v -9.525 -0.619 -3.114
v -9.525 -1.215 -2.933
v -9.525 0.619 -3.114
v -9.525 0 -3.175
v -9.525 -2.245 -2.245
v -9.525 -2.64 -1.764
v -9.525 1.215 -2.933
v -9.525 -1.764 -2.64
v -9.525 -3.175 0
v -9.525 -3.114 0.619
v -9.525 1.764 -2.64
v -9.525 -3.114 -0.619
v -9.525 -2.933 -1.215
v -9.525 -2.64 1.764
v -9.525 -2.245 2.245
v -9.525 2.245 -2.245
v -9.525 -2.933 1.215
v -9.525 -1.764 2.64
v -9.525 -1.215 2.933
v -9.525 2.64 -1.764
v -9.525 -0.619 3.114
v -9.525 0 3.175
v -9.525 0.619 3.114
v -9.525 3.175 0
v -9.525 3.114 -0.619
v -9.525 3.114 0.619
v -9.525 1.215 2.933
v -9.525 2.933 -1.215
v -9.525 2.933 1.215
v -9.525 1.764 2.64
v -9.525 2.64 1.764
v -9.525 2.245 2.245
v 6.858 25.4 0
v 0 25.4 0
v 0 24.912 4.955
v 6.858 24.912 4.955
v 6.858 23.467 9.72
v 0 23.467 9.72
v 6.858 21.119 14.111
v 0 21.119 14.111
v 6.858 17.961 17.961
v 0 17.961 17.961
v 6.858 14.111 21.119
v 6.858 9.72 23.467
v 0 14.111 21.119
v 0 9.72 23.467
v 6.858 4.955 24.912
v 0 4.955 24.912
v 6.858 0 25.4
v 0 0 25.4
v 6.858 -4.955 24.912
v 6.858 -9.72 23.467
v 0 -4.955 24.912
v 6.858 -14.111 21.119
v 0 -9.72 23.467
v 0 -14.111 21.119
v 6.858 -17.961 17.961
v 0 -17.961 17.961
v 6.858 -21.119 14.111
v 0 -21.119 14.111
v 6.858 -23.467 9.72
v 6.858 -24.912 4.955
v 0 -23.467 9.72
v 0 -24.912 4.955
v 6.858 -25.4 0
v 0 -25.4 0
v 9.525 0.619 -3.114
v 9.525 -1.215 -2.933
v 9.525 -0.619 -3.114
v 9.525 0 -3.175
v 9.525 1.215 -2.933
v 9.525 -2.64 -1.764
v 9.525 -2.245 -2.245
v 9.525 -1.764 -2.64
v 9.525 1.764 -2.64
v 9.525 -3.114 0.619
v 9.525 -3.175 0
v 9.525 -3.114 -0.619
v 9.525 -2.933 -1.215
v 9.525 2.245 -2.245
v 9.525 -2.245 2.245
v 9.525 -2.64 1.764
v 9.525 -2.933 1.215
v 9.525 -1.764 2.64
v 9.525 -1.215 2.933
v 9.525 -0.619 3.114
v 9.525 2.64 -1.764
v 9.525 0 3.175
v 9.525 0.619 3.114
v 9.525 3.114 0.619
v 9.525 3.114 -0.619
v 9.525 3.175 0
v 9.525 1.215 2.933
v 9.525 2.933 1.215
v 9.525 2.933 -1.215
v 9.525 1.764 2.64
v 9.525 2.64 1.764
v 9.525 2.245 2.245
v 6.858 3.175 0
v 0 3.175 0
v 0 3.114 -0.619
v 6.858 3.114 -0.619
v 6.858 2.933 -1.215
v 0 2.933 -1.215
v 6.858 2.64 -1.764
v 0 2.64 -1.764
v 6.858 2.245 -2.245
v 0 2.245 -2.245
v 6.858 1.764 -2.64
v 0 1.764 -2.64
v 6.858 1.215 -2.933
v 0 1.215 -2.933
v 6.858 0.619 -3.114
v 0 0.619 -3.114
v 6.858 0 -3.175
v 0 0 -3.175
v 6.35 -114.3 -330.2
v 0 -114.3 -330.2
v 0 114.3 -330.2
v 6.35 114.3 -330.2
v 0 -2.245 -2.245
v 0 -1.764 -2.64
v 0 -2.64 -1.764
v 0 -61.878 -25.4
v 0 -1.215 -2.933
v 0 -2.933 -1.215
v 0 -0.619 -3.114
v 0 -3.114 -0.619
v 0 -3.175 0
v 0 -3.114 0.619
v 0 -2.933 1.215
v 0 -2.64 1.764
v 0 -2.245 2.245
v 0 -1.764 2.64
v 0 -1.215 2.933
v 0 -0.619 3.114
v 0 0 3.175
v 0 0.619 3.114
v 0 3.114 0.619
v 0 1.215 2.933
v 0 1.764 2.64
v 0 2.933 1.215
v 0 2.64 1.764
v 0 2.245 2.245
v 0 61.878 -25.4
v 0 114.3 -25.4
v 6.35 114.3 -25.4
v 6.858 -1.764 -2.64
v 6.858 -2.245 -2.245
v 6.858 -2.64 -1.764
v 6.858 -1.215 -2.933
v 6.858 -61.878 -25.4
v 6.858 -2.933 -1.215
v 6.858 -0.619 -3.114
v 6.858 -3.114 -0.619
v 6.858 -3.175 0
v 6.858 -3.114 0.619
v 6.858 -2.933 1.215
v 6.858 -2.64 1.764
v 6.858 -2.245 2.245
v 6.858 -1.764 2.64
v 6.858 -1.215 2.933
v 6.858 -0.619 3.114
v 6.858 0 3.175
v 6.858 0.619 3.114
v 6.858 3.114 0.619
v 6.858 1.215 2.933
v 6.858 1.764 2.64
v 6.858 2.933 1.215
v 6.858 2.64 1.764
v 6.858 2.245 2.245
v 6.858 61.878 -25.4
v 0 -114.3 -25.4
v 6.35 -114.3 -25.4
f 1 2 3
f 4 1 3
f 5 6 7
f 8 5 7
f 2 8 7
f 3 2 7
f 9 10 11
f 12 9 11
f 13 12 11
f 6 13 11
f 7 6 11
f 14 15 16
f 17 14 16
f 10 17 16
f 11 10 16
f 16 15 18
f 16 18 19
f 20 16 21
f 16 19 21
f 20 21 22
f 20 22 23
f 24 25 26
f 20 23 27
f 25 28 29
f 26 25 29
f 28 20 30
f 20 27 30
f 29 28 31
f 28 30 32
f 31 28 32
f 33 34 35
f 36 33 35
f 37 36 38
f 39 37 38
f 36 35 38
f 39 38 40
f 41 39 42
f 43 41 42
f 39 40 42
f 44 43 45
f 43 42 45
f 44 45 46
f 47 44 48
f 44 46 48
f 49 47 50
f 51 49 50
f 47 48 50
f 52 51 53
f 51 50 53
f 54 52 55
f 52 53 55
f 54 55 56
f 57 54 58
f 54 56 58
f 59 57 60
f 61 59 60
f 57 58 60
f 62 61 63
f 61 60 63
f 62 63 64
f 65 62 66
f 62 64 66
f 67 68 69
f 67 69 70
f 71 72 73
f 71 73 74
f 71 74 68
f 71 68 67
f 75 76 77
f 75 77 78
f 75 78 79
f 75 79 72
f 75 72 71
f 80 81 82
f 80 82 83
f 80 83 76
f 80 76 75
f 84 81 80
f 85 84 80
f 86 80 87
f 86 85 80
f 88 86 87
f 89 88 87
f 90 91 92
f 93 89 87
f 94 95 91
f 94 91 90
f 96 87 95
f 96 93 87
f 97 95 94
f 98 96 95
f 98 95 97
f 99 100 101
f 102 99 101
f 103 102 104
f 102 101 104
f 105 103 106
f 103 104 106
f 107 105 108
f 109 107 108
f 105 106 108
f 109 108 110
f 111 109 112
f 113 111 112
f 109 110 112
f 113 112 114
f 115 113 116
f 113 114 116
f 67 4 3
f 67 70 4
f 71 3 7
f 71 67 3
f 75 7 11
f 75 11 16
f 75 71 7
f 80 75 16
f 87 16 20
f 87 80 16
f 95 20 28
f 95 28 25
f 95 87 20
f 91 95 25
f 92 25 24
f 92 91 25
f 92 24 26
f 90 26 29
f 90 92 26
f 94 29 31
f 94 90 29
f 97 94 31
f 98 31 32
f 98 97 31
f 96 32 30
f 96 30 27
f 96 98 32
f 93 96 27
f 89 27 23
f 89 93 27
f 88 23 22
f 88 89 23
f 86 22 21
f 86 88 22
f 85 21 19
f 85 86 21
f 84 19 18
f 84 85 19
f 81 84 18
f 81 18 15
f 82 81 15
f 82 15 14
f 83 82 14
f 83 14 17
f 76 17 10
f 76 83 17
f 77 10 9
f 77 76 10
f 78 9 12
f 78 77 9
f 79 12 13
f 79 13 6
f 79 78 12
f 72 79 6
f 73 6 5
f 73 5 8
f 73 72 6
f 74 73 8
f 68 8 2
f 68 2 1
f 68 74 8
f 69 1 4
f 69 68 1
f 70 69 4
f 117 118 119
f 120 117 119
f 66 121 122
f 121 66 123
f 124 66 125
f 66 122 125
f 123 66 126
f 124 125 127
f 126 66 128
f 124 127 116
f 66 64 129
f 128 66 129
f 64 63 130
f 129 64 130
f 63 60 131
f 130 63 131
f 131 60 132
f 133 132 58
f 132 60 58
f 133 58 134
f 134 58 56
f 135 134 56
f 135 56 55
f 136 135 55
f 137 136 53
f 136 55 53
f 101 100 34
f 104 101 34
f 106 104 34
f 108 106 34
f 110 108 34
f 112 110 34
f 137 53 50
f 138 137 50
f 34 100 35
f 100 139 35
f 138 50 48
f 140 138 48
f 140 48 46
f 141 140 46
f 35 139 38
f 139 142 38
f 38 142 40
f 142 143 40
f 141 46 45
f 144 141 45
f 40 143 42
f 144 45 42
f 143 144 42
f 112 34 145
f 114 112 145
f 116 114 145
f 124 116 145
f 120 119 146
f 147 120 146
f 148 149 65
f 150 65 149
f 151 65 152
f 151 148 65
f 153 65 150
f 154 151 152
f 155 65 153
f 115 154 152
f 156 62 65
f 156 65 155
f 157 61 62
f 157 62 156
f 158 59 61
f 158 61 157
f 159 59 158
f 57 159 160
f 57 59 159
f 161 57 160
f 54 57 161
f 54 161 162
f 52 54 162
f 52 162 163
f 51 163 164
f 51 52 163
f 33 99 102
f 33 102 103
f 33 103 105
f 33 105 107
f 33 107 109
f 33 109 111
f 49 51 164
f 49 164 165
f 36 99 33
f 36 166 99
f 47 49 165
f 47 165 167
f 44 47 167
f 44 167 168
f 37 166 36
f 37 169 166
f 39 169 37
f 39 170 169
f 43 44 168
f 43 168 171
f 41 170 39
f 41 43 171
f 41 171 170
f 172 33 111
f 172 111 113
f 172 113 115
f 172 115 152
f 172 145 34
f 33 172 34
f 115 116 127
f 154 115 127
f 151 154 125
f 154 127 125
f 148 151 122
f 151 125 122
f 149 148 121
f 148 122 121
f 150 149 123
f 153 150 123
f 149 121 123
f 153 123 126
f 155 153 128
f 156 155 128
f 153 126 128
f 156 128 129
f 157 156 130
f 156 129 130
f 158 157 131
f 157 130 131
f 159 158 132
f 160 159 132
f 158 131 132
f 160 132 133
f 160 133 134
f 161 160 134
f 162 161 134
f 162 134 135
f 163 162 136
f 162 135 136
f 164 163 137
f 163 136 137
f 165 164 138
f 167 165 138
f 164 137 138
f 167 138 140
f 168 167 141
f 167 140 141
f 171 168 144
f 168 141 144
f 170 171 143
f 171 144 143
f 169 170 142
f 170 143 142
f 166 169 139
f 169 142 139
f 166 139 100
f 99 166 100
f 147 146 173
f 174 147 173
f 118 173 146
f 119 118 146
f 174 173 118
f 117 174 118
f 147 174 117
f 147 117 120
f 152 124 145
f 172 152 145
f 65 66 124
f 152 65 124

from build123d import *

# Parameters (mm, degrees)
F1_DEPTH = 9.525
F2_DEPTH = 6.35
F3_DEPTH = 6.858


with BuildPart() as f1:
    # F0 (on Right) → F1 (new body, symmetric)
    with BuildSketch(Plane.YZ):
        with BuildLine():
            ThreePointArc((0, -3.175), (2.245064, -2.245064), (3.175, 0))
            ThreePointArc((3.175, 0), (-2.245064, 2.245064), (0, -3.175))
        make_face()
    extrude(amount=F1_DEPTH, both=True)


with BuildPart() as f2:
    # F0 (on Right) → F2 (new body)
    with BuildSketch(Plane.YZ):
        Polygon((61.877973, -25.4), (0, -25.4), (-61.877973, -25.4), (-114.3, -25.4), (-114.3, -330.2), (114.3, -330.2), (114.3, -25.4), align=None)
    extrude(amount=F2_DEPTH)


with BuildPart() as f3:
    # F0 (on Right) → F3 (new body)
    with BuildSketch(Plane.YZ):
        with BuildLine():
            Line((-61.877973, -25.4), (0, -25.4))
            ThreePointArc((0, -25.4), (-17.960512, -17.960512), (-25.4, 0))
            Line((-25.4, 0), (-61.877973, -25.4))
        make_face()
        with BuildLine():
            ThreePointArc((-25.4, 0), (-17.960512, -17.960512), (0, -25.4))
            ThreePointArc((0, -25.4), (17.960512, -17.960512), (25.4, 0))
            ThreePointArc((25.4, 0), (0, 25.4), (-25.4, 0))
        make_face()
        with BuildLine():
            ThreePointArc((0, -3.175), (-2.245064, 2.245064), (3.175, 0))
            ThreePointArc((3.175, 0), (2.245064, -2.245064), (0, -3.175))
        make_face(mode=Mode.SUBTRACT)
        with BuildLine():
            ThreePointArc((25.4, 0), (17.960512, -17.960512), (0, -25.4))
            Line((0, -25.4), (61.877973, -25.4))
            Line((61.877973, -25.4), (25.4, 0))
        make_face()
    extrude(amount=F3_DEPTH)


solid = Compound([f1.part, f2.part, f3.part])
